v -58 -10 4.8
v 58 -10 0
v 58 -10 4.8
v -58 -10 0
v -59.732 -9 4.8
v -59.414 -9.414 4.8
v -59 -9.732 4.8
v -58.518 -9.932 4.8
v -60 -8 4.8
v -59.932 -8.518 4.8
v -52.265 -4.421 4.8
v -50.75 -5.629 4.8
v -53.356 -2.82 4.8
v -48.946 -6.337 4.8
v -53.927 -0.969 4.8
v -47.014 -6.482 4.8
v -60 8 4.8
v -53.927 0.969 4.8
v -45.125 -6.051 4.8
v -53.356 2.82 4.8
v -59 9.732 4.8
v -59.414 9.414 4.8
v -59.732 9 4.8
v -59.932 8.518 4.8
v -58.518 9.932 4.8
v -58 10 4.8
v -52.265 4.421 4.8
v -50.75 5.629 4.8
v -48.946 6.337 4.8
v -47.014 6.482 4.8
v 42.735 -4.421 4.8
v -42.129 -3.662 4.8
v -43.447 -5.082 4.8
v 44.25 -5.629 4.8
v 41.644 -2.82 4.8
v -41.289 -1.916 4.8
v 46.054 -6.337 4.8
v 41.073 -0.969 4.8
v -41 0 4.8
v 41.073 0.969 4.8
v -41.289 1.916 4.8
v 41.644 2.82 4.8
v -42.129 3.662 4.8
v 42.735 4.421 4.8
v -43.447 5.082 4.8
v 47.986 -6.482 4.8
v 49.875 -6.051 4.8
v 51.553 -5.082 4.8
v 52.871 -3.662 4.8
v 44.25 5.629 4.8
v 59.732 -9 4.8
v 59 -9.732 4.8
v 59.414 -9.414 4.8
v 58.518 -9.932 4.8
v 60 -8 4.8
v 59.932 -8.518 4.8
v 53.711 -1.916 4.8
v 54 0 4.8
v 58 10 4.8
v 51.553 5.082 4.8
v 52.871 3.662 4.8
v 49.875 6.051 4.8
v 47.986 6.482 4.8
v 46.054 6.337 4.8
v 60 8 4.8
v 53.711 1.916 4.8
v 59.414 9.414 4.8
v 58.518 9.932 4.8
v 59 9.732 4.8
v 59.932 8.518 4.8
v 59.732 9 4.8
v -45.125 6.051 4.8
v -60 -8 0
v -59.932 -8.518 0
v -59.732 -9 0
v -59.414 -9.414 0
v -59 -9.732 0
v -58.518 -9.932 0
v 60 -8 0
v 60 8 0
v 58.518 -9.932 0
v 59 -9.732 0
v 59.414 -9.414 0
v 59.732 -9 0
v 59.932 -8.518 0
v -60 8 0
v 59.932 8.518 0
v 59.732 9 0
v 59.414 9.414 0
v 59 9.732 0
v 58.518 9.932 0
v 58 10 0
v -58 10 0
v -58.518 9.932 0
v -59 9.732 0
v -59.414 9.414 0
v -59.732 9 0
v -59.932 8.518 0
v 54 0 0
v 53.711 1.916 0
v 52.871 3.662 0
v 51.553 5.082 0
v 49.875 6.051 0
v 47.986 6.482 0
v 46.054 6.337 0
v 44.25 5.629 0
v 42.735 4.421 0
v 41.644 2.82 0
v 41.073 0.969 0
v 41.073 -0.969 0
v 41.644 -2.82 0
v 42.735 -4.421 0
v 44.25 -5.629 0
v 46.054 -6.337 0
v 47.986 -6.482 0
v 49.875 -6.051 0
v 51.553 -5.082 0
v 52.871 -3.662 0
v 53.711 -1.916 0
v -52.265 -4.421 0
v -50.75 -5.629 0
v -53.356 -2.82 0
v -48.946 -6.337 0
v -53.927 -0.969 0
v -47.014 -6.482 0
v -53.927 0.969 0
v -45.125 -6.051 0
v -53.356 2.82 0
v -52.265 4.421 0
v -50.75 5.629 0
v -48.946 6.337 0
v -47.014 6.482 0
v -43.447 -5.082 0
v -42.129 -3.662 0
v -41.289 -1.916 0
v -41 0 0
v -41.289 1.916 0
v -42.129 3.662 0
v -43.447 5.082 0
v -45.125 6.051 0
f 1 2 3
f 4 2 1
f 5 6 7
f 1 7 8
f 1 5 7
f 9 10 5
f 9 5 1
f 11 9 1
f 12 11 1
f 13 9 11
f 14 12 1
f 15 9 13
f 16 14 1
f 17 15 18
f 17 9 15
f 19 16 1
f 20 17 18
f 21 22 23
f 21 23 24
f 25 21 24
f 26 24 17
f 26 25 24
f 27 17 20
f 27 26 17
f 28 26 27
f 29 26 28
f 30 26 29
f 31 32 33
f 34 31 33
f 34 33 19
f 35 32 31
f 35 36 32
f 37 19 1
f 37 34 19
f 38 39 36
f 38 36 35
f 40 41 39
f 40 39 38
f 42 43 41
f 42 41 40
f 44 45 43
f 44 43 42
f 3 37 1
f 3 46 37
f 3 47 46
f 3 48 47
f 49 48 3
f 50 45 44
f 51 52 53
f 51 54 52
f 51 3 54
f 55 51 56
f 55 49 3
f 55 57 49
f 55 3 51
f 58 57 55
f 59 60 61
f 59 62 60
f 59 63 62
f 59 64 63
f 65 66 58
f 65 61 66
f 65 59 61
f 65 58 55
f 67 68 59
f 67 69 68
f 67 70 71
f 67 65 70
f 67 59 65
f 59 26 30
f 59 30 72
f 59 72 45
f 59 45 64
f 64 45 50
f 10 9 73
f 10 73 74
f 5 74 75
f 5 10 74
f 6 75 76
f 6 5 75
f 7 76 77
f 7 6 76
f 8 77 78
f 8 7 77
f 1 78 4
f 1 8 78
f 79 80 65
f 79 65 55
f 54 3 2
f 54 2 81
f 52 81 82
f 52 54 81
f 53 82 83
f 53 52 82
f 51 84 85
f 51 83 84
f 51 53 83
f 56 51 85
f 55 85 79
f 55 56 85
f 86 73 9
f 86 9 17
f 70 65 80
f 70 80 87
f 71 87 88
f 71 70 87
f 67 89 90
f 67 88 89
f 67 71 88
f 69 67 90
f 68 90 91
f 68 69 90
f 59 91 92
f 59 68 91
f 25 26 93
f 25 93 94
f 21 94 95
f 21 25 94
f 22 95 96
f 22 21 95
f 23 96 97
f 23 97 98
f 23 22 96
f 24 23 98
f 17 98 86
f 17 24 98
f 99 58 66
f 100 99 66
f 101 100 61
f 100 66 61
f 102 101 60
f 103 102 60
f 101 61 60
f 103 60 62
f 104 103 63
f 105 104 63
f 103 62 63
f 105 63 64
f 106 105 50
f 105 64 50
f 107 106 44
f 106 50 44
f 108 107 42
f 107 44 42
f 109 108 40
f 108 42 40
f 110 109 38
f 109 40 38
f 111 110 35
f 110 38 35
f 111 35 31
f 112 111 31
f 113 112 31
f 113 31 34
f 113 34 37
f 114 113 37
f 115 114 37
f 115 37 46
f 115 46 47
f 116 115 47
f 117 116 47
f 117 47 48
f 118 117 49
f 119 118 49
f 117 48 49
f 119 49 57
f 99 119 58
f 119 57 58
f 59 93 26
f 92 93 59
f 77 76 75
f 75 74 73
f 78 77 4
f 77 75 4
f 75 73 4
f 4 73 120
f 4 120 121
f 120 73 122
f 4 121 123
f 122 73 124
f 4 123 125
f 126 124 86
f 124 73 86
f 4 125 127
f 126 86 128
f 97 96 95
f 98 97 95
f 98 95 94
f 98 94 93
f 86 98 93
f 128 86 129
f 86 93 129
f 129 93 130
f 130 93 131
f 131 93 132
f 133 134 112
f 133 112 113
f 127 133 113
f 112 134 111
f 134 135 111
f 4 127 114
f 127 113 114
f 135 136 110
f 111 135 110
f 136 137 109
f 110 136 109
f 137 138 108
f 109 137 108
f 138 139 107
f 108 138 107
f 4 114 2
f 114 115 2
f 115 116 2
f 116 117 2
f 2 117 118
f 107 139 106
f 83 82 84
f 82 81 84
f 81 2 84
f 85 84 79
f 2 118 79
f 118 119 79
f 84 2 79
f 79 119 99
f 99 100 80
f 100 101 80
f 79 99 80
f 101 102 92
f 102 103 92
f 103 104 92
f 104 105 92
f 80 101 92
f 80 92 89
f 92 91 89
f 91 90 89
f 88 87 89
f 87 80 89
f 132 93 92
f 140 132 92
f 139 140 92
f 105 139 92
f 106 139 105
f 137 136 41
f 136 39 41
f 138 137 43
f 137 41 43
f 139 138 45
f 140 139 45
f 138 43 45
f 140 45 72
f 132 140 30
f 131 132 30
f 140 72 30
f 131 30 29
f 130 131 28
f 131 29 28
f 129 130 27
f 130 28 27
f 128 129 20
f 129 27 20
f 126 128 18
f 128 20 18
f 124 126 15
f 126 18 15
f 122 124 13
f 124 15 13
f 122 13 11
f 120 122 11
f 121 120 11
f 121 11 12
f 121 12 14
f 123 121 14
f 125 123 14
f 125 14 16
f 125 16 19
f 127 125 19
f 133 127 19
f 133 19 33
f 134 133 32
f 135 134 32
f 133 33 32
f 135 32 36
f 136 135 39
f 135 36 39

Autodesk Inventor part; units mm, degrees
ref_plane "YZ Plane" through (0, 0, 0) normal (1, 0, 0) x (0, 1, 0)
ref_plane "XZ Plane" through (0, 0, 0) normal (0, 1, 0) x (-1, 0, 0)
ref_plane "XY Plane" through (0, 0, 0) normal (0, 0, 1) x (1, 0, 0)
sketch "Sketch1" plane through (0, 0, 0) normal (0, 0, 1) x (1, 0, 0)
  line L0 (0, 14) -> (0, -14) projected
  line L1 (-84, 0) -> (84, 0) projected
  line L2 (-60, 10) -> (60, 10)
  line L3 (60, 10) -> (60, -10)
  line L4 (60, -10) -> (-60, -10)
  line L5 (-60, -10) -> (-60, 10)
  point P0 (0, 0)
  dimension "d0" = 120
  dimension "d1" = 20
extrude "Extrusion1" add sketch "Sketch1" along normal blind 4.8
sketch "Sketch2" plane through (0, 0, 4.8) normal (0, 0, 1) x (1, 0, 0)
  line L0 (-60, -10) -> (60, -10) projected
  line L1 (60, -10) -> (60, 10) projected
  line L2 (60, 10) -> (-60, 10) projected
  line L3 (-60, 10) -> (-60, -10) projected
  circle A0 centre (-47.5, 0) radius 6.5
  circle A1 centre (47.5, 0) radius 6.5
  line L4 (0, 14) -> (0, -14) projected
  point P0 (0, 0)
  dimension "d4" = 13
  dimension "d5" = 13
  dimension "d6" = 95
extrude "Extrusion2" cut sketch "Sketch2" against normal through all contours A0 | A1
fillet "Fillet1" radius 2 4 edges at (-60, 10, 2.4) (-60, -10, 2.4) (60, 10, 2.4) (60, -10, 2.4)
properties part number "rodFixer"
